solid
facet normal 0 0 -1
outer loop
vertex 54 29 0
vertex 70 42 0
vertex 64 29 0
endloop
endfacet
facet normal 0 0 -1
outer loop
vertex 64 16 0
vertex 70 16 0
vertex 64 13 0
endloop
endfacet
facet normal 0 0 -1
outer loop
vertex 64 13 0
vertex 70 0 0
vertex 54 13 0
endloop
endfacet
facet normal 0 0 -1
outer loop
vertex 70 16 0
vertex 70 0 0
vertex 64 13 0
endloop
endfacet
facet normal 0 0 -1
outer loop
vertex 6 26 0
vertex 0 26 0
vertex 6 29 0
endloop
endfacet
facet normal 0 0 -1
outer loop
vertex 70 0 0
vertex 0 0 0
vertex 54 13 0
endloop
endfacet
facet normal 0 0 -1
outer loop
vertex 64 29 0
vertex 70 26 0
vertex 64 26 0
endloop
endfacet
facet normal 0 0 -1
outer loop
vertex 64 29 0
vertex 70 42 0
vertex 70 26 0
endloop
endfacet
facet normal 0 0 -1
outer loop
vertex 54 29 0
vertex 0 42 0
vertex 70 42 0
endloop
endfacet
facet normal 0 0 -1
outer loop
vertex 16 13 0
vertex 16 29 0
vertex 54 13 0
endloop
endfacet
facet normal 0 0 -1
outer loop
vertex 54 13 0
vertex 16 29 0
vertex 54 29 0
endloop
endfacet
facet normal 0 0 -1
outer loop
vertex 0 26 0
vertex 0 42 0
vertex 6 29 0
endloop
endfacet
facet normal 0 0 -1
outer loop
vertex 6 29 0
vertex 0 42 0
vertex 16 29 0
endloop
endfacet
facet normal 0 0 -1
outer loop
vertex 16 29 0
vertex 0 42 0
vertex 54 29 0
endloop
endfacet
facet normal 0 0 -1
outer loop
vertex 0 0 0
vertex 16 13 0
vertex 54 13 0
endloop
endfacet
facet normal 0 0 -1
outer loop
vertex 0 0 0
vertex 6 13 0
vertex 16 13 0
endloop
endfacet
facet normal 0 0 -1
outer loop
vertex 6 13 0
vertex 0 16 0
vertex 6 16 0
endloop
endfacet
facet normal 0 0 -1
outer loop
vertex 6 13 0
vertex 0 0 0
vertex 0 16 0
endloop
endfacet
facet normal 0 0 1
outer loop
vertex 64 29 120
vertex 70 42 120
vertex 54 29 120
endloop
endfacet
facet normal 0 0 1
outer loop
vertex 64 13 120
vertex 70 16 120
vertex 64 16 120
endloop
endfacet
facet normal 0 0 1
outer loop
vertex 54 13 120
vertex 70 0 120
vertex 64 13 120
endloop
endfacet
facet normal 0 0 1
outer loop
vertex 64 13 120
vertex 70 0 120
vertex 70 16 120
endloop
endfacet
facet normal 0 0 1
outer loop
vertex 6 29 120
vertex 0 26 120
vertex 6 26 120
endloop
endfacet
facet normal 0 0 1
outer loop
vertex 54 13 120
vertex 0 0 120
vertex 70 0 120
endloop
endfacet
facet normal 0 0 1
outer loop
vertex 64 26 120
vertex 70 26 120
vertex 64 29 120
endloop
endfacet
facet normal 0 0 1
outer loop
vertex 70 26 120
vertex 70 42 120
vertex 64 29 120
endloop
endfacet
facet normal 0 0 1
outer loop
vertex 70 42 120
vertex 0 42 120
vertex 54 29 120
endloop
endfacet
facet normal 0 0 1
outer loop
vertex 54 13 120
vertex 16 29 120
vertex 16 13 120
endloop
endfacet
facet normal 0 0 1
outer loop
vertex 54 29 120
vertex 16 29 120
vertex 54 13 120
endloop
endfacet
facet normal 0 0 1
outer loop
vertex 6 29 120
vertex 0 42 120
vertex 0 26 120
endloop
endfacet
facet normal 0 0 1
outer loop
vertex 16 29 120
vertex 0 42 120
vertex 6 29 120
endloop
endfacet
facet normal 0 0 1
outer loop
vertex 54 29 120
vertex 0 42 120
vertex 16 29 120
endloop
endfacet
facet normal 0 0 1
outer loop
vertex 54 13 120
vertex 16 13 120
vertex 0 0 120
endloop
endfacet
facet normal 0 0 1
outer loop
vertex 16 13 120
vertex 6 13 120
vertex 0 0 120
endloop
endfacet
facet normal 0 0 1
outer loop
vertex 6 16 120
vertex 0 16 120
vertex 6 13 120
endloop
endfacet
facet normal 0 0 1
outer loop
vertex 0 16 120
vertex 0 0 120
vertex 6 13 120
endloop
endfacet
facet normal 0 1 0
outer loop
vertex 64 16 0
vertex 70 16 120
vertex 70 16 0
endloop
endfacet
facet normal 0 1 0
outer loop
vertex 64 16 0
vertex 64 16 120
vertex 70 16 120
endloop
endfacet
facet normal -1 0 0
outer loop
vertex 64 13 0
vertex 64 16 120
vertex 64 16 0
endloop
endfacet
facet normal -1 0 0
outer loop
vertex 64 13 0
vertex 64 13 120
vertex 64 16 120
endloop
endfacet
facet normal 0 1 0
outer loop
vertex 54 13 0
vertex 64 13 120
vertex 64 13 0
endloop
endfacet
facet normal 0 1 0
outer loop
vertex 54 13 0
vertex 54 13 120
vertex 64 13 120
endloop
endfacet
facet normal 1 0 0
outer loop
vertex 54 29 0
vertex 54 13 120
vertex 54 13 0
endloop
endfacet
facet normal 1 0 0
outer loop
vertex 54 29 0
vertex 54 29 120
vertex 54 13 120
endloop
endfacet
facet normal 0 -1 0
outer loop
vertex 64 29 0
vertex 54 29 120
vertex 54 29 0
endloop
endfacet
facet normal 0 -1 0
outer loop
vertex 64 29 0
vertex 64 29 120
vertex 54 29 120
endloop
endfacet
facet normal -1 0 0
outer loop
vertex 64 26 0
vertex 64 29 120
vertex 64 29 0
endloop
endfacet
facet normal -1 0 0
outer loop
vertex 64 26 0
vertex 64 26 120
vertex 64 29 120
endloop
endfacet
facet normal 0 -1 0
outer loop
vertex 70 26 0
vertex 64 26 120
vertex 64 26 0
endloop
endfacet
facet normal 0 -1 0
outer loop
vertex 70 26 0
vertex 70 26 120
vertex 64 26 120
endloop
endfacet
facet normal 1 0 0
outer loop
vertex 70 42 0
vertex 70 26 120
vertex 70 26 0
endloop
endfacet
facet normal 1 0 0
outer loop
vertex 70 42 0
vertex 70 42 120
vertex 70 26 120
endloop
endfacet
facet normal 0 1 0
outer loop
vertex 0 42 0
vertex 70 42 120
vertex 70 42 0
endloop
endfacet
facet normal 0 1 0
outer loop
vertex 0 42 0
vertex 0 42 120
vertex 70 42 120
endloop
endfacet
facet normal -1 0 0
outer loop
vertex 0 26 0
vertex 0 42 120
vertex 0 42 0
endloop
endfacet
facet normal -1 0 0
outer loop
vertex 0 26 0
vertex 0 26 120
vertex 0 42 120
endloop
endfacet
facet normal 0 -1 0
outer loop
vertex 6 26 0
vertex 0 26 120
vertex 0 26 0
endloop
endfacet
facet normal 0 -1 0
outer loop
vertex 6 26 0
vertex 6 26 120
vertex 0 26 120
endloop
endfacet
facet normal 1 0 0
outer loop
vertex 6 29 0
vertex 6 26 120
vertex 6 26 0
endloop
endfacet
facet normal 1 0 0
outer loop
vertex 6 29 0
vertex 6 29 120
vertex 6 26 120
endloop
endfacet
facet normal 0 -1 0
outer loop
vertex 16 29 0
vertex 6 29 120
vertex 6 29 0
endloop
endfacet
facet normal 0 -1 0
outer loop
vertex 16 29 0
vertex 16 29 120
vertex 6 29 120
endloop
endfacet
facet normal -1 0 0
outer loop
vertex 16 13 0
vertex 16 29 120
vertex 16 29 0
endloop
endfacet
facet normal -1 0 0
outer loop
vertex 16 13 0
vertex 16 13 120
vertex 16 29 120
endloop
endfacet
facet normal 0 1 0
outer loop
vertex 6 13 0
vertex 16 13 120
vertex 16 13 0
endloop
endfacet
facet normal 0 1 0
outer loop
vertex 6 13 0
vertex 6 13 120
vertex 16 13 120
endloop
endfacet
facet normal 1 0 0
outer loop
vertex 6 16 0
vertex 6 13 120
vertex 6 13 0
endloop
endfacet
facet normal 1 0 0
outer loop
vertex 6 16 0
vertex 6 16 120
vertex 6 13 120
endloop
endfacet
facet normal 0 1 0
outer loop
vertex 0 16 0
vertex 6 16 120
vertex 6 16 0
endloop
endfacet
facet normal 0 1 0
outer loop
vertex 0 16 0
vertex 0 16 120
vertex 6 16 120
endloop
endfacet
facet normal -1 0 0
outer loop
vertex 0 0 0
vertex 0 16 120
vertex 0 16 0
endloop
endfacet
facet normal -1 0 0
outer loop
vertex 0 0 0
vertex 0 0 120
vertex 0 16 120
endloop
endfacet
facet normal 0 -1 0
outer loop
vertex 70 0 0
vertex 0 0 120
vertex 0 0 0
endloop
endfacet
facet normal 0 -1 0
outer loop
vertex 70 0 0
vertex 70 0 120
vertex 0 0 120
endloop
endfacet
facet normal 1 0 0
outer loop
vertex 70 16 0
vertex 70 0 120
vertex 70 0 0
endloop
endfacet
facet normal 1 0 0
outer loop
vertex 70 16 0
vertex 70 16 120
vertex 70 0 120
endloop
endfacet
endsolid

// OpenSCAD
$fn = 32;

// ----------------------------------------------------------------------
// T-slot rail: 70 x 42 mm section, 120 mm long
// ----------------------------------------------------------------------

// --- parameters (mm) ---
profile_height = 120;     // extrusion height
profile_points = 20;      // points of the closed outline

profile = [[0, 0], [70, 0], [70, 16], [64, 16], [64, 13], [54, 13], [54, 29], [64, 29], [64, 26], [70, 26], [70, 42], [0, 42], [0, 26], [6, 26], [6, 29], [16, 29], [16, 13], [6, 13], [6, 16], [0, 16]];  // single closed polygon, 20 points, counter clockwise

// --- the one profile operation ---
linear_extrude(height = profile_height) polygon(points = profile);
